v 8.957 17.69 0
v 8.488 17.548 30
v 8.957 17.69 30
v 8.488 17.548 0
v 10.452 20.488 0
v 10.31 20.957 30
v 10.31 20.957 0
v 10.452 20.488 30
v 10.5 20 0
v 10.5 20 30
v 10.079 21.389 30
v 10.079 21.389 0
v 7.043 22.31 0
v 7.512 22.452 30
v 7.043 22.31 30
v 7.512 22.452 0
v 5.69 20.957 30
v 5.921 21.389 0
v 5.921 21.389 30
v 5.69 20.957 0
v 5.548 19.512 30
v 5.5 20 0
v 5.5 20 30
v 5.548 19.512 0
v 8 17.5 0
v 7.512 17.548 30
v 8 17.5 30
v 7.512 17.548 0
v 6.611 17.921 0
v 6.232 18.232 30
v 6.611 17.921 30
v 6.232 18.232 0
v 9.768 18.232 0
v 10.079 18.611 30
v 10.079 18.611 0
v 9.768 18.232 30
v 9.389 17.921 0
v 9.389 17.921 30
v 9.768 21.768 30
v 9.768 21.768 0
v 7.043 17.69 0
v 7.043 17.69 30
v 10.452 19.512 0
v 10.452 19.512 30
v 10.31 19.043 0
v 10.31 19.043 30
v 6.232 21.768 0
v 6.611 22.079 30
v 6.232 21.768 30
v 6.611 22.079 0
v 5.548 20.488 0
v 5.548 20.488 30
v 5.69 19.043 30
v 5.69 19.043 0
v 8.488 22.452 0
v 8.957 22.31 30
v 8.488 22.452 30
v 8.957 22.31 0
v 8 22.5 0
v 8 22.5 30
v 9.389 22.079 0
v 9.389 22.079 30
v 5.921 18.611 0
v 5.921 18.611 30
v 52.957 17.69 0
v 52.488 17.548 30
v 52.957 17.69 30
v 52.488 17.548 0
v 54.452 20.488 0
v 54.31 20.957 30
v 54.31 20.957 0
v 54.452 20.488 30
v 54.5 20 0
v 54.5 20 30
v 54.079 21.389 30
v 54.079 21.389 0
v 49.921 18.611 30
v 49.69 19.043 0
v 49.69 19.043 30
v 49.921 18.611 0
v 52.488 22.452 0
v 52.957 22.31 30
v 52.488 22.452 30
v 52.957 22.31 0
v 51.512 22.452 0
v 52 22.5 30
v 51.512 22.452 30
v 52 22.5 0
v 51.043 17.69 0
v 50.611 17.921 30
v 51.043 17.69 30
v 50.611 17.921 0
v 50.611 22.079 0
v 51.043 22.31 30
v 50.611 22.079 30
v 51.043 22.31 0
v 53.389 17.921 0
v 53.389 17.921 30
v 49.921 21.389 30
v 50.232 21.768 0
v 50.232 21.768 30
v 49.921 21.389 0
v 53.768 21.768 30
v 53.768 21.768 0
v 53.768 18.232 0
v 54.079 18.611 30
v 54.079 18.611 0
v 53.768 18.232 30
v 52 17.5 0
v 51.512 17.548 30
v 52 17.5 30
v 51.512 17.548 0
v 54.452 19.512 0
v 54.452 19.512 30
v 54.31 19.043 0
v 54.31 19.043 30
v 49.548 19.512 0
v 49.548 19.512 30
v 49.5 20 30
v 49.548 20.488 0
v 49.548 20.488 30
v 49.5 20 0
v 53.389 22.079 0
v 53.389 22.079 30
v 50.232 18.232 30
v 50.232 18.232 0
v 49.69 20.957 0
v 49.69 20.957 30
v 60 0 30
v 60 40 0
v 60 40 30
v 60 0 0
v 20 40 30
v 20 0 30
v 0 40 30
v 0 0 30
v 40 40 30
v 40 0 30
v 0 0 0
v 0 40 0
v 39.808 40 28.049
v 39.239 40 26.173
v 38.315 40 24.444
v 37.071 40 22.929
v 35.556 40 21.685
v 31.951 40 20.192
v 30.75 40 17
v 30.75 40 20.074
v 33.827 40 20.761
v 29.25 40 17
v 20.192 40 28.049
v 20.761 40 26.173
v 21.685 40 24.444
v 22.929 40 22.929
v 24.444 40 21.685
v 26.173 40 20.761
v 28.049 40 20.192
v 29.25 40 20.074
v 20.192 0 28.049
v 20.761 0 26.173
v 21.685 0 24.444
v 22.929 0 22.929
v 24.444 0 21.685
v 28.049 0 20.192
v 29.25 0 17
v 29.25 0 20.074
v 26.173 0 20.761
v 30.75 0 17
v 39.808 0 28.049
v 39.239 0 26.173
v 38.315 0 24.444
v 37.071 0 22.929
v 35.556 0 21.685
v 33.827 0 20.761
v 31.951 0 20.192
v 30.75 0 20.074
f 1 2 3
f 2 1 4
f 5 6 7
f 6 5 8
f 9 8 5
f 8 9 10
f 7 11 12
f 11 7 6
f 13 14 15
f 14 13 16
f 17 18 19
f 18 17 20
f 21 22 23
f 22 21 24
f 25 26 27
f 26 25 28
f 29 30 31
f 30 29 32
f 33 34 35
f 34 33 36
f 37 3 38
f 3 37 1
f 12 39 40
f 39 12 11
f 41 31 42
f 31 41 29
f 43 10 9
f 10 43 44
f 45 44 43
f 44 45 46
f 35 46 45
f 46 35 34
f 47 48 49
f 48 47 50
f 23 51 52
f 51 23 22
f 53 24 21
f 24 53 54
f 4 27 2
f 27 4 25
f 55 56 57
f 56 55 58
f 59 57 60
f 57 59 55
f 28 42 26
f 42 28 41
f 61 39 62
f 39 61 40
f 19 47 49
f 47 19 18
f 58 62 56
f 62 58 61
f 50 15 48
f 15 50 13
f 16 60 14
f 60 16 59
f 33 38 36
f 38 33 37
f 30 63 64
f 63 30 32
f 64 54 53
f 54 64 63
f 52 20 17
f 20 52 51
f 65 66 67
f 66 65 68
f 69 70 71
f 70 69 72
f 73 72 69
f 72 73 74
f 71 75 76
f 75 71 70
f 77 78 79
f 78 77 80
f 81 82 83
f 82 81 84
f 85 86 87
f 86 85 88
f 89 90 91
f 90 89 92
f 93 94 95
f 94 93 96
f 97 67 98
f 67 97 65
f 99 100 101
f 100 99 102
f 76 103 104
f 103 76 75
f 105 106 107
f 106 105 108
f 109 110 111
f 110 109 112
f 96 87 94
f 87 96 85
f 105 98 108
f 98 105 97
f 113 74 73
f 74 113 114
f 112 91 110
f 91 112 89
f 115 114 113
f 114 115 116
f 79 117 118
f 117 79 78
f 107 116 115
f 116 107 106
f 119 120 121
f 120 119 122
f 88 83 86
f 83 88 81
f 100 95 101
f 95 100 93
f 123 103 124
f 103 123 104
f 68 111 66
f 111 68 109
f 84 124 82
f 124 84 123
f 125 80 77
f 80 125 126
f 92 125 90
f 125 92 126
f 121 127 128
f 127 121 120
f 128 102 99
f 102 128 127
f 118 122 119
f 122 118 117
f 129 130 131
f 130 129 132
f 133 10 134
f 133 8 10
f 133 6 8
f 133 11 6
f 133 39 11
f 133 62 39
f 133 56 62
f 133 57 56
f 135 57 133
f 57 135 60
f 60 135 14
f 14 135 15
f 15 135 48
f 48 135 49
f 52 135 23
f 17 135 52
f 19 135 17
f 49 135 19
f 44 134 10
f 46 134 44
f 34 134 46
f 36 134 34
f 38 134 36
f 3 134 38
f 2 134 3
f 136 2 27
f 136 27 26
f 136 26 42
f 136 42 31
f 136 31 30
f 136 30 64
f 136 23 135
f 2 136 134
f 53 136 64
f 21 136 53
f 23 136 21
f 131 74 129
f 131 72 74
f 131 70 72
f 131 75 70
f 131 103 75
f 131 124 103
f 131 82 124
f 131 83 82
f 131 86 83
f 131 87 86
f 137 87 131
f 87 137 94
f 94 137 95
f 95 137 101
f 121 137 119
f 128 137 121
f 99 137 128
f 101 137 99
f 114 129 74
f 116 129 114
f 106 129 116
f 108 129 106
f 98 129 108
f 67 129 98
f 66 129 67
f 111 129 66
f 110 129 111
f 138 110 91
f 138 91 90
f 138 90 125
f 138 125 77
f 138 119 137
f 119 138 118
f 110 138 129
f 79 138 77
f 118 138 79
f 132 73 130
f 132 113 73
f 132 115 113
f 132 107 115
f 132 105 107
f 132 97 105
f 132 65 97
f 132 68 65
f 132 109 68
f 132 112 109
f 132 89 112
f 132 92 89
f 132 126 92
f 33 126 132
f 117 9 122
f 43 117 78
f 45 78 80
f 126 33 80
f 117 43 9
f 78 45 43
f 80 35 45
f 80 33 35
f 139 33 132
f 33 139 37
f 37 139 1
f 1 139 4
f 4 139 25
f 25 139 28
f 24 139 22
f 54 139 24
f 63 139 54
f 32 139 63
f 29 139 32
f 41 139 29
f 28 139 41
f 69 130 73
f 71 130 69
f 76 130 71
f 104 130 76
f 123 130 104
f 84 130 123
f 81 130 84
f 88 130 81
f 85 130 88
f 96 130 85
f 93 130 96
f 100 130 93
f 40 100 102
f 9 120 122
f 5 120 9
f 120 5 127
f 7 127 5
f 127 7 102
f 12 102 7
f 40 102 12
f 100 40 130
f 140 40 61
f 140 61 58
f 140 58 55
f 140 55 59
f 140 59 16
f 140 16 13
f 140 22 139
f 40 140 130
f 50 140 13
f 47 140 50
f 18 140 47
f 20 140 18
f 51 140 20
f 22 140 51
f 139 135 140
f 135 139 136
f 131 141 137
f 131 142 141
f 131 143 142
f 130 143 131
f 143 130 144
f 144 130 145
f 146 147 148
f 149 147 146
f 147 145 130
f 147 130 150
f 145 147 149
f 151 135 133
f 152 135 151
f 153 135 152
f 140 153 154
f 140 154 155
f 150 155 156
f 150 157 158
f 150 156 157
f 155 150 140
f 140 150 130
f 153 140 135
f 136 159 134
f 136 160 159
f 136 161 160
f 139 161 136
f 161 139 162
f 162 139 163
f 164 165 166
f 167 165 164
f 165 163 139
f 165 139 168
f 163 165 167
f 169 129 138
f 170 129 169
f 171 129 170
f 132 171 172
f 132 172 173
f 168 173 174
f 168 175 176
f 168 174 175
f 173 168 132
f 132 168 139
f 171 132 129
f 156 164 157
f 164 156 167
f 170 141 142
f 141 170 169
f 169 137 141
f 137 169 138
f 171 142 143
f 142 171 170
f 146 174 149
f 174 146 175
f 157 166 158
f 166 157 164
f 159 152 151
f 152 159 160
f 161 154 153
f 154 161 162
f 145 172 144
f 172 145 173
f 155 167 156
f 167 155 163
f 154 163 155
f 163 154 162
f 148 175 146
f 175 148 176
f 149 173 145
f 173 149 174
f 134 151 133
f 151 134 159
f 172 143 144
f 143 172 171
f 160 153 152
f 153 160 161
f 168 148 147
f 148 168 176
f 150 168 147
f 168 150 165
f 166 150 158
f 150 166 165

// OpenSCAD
$fn = 32;

// ----------------------------------------------------------------------
// Saddle clamp: split shaft clamp
// ----------------------------------------------------------------------

// --- parameters (mm) ---
blk_l = 60;               // block length, X
blk_w = 40;               // block width, Y
blk_h = 30;               // block height
clamp_r = 10;             // shaft groove radius
hole_r = 2.5;             // bolt hole radius
hole_m = 8;               // bolt hole margin from the ends
saw_w = 1.5;              // saw kerf width

saw_depth = clamp_r + 3;  // saw kerf depth

difference() {
  cube([blk_l, blk_w, blk_h]);
  translate([blk_l / 2, -1, blk_h])
    rotate([-90, 0, 0])
      cylinder(h = blk_w + 2, r = clamp_r);
  for (sx = [0, 1])
    translate([sx ? blk_l - hole_m : hole_m, blk_w / 2, -1])
      cylinder(r = hole_r, h = blk_h + 2);
  translate([blk_l / 2 - saw_w / 2, -1, blk_h - saw_depth])
    cube([saw_w, blk_w + 2, saw_depth + 1]);
}
